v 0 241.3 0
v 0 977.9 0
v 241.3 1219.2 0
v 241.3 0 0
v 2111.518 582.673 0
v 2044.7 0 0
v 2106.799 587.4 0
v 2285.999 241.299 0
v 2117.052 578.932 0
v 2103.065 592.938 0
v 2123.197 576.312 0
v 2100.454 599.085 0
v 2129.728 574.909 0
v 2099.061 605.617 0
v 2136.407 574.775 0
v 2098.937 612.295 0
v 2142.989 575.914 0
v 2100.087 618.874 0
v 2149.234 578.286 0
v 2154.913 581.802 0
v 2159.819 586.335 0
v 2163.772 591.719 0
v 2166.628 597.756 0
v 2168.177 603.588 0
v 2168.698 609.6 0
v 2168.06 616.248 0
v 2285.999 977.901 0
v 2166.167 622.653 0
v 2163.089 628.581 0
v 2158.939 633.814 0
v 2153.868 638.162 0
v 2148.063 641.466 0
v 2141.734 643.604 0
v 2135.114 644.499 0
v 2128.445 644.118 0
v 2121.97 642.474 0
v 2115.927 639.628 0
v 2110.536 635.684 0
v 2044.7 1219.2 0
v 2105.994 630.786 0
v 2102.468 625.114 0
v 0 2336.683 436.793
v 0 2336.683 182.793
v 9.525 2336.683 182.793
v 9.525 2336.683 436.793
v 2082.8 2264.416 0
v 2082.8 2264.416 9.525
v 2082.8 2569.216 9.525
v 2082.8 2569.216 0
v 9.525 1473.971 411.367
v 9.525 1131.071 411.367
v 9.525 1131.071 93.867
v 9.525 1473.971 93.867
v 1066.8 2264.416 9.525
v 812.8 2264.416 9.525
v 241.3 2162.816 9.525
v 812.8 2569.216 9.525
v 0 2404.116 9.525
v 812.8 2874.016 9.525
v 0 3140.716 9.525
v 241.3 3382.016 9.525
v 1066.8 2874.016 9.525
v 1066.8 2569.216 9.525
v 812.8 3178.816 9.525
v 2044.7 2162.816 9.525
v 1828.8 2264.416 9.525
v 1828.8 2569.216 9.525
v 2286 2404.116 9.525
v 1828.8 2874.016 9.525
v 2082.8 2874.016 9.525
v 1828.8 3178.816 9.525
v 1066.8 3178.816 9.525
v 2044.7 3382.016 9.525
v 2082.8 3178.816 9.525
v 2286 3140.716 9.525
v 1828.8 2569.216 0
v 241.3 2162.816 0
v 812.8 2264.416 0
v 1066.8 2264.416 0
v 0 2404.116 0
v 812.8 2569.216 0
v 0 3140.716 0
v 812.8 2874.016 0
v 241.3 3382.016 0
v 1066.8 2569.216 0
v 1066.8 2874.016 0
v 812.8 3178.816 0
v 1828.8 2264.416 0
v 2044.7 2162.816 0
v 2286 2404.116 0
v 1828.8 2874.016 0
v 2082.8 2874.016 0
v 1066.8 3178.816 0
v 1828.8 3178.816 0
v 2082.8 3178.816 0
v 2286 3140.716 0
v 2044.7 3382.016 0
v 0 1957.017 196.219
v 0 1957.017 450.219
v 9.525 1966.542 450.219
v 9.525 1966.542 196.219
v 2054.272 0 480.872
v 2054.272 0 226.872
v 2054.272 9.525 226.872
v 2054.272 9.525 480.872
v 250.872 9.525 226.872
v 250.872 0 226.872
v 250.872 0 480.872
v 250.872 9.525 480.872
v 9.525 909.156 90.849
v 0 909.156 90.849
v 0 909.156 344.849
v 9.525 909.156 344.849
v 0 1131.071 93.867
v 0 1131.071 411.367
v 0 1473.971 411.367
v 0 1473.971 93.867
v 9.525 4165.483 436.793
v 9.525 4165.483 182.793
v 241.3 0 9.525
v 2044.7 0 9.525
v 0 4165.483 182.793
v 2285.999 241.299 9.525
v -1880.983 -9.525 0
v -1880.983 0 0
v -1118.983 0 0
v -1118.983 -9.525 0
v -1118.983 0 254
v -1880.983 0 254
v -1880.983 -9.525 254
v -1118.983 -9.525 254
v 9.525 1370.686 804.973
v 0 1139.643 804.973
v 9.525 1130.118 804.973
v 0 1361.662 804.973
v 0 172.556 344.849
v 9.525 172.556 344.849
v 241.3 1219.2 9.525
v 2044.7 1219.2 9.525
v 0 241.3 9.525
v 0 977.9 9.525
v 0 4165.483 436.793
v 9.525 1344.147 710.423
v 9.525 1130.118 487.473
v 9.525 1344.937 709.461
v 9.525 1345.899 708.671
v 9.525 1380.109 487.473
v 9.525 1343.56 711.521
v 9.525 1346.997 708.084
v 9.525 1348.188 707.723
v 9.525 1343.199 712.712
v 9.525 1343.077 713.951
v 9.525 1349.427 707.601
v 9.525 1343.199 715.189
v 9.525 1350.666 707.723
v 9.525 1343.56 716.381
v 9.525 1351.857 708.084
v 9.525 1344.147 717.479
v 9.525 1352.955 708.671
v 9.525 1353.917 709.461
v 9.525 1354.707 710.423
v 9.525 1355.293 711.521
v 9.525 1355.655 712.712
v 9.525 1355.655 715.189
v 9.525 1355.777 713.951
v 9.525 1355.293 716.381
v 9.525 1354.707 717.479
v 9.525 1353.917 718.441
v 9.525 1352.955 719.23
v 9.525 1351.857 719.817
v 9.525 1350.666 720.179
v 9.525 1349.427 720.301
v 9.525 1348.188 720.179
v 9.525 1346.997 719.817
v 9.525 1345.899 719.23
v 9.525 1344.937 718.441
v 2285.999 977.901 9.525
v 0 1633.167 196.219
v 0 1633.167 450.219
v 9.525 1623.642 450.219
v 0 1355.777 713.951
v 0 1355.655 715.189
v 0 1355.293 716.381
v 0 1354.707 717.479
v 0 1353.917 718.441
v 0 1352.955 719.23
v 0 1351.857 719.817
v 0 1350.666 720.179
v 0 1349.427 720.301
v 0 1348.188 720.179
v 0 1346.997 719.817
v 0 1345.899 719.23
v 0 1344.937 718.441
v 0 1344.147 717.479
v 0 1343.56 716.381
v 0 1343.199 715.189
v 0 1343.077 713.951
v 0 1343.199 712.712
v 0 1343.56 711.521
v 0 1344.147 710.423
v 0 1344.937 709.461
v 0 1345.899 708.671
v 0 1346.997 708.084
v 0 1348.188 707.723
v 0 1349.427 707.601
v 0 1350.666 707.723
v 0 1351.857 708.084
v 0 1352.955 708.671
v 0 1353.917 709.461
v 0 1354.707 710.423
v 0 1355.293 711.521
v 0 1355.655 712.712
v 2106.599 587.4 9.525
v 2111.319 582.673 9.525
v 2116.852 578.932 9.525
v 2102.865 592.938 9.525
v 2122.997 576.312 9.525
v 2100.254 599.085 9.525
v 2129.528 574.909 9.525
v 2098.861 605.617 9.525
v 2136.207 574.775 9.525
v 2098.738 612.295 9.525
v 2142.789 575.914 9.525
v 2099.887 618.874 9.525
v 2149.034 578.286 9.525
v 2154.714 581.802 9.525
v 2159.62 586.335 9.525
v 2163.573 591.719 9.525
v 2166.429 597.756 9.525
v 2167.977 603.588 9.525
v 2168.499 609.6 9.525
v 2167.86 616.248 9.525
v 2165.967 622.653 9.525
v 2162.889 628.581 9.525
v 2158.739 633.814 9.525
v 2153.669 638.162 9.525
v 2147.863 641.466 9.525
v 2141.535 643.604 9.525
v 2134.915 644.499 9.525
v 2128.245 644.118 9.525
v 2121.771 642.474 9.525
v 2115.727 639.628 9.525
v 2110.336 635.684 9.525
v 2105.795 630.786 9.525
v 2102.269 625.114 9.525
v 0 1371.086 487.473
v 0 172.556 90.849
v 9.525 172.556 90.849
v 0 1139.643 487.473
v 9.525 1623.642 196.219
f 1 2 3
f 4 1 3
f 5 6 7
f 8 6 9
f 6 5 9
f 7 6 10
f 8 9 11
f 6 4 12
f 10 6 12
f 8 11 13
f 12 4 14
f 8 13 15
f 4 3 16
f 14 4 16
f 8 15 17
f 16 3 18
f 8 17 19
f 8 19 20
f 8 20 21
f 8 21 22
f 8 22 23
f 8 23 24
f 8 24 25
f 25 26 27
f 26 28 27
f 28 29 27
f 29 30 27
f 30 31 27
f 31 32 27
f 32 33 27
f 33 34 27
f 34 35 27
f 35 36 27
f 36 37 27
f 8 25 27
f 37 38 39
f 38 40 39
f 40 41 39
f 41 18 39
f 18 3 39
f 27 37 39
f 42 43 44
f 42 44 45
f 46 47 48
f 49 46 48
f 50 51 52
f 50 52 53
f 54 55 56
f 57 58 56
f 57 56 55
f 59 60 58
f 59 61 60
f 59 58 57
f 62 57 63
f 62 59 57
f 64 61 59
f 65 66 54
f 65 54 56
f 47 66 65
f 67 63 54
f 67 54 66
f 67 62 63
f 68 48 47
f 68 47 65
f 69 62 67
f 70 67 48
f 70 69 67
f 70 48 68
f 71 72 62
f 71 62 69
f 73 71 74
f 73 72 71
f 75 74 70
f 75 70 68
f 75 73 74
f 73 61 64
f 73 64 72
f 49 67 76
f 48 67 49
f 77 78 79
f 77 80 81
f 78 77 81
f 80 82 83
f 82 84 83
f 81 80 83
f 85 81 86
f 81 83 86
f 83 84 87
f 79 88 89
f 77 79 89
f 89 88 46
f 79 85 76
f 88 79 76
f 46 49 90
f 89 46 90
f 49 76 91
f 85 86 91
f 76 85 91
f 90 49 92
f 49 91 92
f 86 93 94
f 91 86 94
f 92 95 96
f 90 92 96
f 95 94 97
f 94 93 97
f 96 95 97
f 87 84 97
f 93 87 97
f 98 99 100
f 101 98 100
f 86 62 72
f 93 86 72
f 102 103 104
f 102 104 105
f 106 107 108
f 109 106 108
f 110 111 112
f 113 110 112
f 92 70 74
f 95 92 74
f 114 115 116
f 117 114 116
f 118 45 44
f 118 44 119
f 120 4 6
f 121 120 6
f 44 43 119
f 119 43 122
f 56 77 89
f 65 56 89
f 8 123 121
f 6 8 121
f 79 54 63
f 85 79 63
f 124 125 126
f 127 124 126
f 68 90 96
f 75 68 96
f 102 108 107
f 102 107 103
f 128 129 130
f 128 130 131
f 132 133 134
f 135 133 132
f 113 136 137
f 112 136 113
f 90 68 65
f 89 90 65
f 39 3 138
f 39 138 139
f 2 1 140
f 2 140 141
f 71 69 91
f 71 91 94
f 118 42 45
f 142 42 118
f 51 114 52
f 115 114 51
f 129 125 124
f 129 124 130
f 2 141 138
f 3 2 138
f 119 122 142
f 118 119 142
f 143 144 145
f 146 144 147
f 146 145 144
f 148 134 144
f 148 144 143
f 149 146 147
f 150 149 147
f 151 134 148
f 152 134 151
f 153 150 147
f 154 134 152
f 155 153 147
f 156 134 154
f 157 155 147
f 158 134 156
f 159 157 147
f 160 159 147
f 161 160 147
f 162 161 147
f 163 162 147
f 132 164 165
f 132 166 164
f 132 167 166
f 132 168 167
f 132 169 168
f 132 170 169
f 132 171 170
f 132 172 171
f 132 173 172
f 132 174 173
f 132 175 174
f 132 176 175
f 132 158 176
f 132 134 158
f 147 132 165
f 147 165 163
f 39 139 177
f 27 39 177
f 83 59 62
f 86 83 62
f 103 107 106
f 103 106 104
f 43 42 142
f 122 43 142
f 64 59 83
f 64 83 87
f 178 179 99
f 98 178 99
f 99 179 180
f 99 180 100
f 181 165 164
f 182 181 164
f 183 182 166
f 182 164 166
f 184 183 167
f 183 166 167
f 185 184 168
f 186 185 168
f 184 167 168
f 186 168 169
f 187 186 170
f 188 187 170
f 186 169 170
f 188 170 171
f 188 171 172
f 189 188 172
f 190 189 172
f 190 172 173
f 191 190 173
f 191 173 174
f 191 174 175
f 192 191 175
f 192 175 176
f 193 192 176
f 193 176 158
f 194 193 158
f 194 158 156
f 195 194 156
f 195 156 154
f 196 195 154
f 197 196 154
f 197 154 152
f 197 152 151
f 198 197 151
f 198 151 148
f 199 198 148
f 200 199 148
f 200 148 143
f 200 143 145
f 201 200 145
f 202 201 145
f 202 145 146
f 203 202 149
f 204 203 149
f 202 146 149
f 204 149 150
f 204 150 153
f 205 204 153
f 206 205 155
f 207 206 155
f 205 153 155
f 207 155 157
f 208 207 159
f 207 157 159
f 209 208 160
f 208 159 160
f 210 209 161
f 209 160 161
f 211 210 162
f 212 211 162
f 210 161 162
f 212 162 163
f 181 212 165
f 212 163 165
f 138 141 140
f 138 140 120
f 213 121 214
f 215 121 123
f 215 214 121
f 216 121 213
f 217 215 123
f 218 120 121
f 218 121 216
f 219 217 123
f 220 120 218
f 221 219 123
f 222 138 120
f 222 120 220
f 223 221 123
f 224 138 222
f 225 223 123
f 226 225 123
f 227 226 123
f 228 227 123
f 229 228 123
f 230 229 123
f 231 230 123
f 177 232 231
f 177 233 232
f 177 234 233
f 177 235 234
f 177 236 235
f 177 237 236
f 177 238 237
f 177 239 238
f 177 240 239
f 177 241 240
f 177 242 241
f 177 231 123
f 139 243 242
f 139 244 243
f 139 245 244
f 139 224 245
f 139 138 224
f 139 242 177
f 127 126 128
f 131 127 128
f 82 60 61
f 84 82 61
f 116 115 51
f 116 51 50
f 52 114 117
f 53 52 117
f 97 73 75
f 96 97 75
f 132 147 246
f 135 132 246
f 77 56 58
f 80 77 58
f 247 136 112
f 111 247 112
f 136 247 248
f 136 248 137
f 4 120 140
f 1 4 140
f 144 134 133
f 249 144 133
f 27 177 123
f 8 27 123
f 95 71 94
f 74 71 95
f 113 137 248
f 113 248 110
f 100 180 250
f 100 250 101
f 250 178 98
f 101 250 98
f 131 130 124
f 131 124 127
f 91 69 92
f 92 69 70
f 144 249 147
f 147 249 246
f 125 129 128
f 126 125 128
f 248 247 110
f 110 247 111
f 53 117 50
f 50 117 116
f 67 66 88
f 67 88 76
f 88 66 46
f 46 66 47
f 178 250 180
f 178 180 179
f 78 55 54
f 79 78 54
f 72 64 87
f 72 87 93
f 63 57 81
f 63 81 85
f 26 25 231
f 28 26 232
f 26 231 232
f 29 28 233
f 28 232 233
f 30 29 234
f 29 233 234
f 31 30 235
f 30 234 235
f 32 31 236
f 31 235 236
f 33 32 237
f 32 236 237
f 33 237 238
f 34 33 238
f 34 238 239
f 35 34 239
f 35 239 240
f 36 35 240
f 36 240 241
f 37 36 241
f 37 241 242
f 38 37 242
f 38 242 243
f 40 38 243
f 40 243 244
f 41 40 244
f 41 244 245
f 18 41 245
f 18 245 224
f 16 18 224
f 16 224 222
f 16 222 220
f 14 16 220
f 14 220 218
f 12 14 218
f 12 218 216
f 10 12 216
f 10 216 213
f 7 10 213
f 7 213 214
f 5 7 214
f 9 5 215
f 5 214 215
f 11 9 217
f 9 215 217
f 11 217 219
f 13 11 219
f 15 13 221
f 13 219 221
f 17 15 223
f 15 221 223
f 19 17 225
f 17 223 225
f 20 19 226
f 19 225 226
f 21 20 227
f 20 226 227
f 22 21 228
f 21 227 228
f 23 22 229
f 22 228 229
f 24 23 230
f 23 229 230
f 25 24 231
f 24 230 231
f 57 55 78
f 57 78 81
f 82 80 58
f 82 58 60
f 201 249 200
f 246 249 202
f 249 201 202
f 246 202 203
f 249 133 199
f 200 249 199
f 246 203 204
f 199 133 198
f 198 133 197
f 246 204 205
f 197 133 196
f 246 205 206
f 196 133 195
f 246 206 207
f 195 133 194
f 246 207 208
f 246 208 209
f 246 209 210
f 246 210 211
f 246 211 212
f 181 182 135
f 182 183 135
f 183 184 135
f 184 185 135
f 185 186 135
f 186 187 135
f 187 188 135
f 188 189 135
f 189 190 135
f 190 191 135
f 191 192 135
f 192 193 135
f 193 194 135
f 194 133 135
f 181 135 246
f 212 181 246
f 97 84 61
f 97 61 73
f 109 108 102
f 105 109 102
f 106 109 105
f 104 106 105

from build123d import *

# Parameters (mm, degrees)
F0_W      = 2438.4
F0_H      = 1219.2
F1_DEPTH  = 9.525
F3_DEPTH  = 25.4
F5_DEPTH  = 25.4
F6_W      = 736.6
F6_H      = 254
F7_DEPTH  = 9.525
F8_W      = 1803.4
F8_H      = 254
F9_DEPTH  = 9.525
F10_W     = 736.6
F10_H     = 317.5
F11_DEPTH = 9.525
F12_W     = 254
F12_H     = 317.5
F13_DEPTH = 9.525
F15_DEPTH = 317.5
F18_DEPTH = 330.2
F19_R     = 6.35
F20_DEPTH = 25.4
F21_W     = 342.9
F21_H     = 317.5
F23_DEPTH = 9.525
F22_W     = 342.9
F22_H     = 254
F24_DEPTH = 9.525
F25_W     = 2286
F25_H     = 1219.2
F26_DEPTH = 9.525
F28_DEPTH = 25.4
F30_W     = 33.3816595376
F30_H     = 808.2542568445
F31_DEPTH = 25.4
F32_W     = 1828.8
F32_H     = 254
F33_DEPTH = 9.525
F34_W     = 762
F34_H     = 254
F35_DEPTH = 9.525
F37_DEPTH = 254
F38_W     = 254
F38_H     = 304.8
F39_DEPTH = 101.6
F40_R     = 34.925
F41_DEPTH = 127


# Not quite as in the source:
# - a feature names something its author has since deleted; it is built from what else it names


with BuildPart() as f1:
    # F0 (on Top) → F1 (new body)
    with BuildSketch(Plane.XY):
        with Locations((1219.2, 609.6)):
            Rectangle(F0_W, F0_H)
    extrude(amount=F1_DEPTH)

    # F2 (on face) → F3 (cut)
    with BuildSketch(Plane.XY.offset(9.525)):
        Polygon((0, 1219.2), (0, 977.9), (241.3, 1219.2), align=None)
        Polygon((241.3, 0), (0, 241.3), (0, 0), align=None)
    extrude(amount=-F3_DEPTH, mode=Mode.SUBTRACT)

    # F4 (on face) → F5 (cut)
    with BuildSketch(Plane.XY.offset(9.525)):
        Polygon((2438.4, 0), (2438.4, 1219.2), (2044.7, 1219.2), (2285.9994819731, 977.9005180269), (2285.9994819731, 241.2994819731), (2044.7, 0), align=None)
    extrude(amount=-F5_DEPTH, mode=Mode.SUBTRACT)

    # F30 (on face) → F31 (cut)
    with BuildSketch(Plane(origin=(-0.1994328009, 0, 9.5208224783), x_dir=(0.9997806835, 0, 0.0209424199), z_dir=(-0.0209424199, 0, 0.9997806835))):
        with Locations((-16.6908297688, 615.603916347)):
            Rectangle(F30_W, F30_H)
    extrude(amount=-F31_DEPTH, mode=Mode.SUBTRACT)

    # F40 (on face) → F41 (cut)
    with BuildSketch(Plane(origin=(-0.1994328009, 0, 9.5208224783), x_dir=(0.9997806835, 0, 0.0209424199), z_dir=(-0.0209424199, 0, 0.9997806835))):
        with Locations((2133.2976010596, 609.6)):
            Circle(F40_R)
    extrude(amount=-F41_DEPTH, mode=Mode.SUBTRACT)


with BuildPart() as f7:
    # F6 (on Right) → F7 (new body)
    with BuildSketch(Plane.YZ):
        with Locations((540.855868909, 217.8485281765)):
            Rectangle(F6_W, F6_H)
    extrude(amount=F7_DEPTH)


with BuildPart() as f9:
    # F8 (on Front) → F9 (new body)
    with BuildSketch(Plane.XZ):
        with Locations((1152.5721657038, 353.8724693788)):
            Rectangle(F8_W, F8_H)
    extrude(amount=-F9_DEPTH)


with BuildPart() as f11:
    # F10 (on Right) → F11 (new body)
    with BuildSketch(Plane.YZ):
        with Locations((396.9467690647, 657.1327268381)):
            Rectangle(F10_W, F10_H)
    extrude(amount=F11_DEPTH)


with BuildPart() as f13:
    # F12 (on Right) → F13 (new body)
    with BuildSketch(Plane.YZ):
        with Locations((1257.1182154525, 646.2227201939)):
            Rectangle(F12_W, F12_H)
    extrude(amount=F13_DEPTH)

    # F14 (on face) → F15 (cut)
    with BuildSketch(Plane.XY.offset(804.9727201939)):
        Polygon((0, 1130.1182154525), (9.525, 1130.1182154525), (0, 1139.6432154525), align=None)
    extrude(amount=-F15_DEPTH, mode=Mode.SUBTRACT)

    # F17 (on face) → F18 (cut)
    with BuildSketch(Plane(origin=(0, -13.2369765094, 446.0001862794), x_dir=(1, 0, 0), z_dir=(0, 0.0296662441, -0.9995598601))):
        Polygon((10.085565038, -1394.4936855086), (9.5443632454, -1393.981218338), (0, -1384.9436044693), (0, -1420.4403162003), (10.085565038, -1420.4403162003), align=None)
    extrude(amount=-F18_DEPTH, mode=Mode.SUBTRACT)

    # F19 (on face) → F20 (cut)
    with BuildSketch(Plane.YZ.offset(9.525)):
        with Locations((1349.4267463684, 713.9506340027)):
            Circle(F19_R)
    extrude(amount=-F20_DEPTH, mode=Mode.SUBTRACT)


with BuildPart() as f23:
    # F21 (on Right) → F23 (new body)
    with BuildSketch(Plane.YZ):
        with Locations((1302.5214076042, 252.6165406551)):
            Rectangle(F21_W, F21_H)
    extrude(amount=F23_DEPTH)


with BuildPart() as f24:
    # F22 (on Right) → F24 (new body)
    with BuildSketch(Plane.YZ):
        with Locations((1795.0915694237, 323.2190309106)):
            Rectangle(F22_W, F22_H)
    extrude(amount=F24_DEPTH)

    # F36 (on face) → F37 (cut)
    with BuildSketch(Plane.XY.offset(450.2190309106)):
        Polygon((0, 1957.0165694237), (9.525, 1966.5415694237), (0, 1966.5415694237), align=None)
        Polygon((0, 1623.6415694237), (9.525, 1623.6415694237), (0, 1633.1665694237), align=None)
    extrude(amount=-F37_DEPTH, mode=Mode.SUBTRACT)


with BuildPart() as f26:
    # F25 (on Top) → F26 (new body)
    with BuildSketch(Plane.XY):
        with Locations((1143, 2772.41582157)):
            Rectangle(F25_W, F25_H)
    extrude(amount=F26_DEPTH)

    # F27 (on face) → F28 (cut)
    with BuildSketch(Plane.XY.offset(9.525)):
        Polygon((241.3, 3382.01582157), (0, 3382.01582157), (0, 3140.71582157), align=None)
        Polygon((241.3, 2162.81582157), (0, 2404.11582157), (0, 2162.81582157), align=None)
        Polygon((2286, 3382.01582157), (2044.7, 3382.01582157), (2286, 3140.71582157), align=None)
        Polygon((2286, 2162.81582157), (2286, 2404.11582157), (2044.7, 2162.81582157), align=None)
    extrude(amount=-F28_DEPTH, mode=Mode.SUBTRACT)

    # F38 (on face) → F39 (cut)
    with BuildSketch(Plane.XY.offset(9.525)):
        with Locations((939.8, 3026.41582157)):
            Rectangle(F38_W, F38_H)
        with Locations((939.8, 2416.81582157)):
            Rectangle(F38_W, F38_H)
        with Locations((1955.8, 3026.41582157)):
            Rectangle(F38_W, F38_H)
        with Locations((1955.8, 2416.81582157)):
            Rectangle(F38_W, F38_H)
    extrude(amount=-F39_DEPTH, mode=Mode.SUBTRACT)


with BuildPart() as f33:
    # F32 (on Right) → F33 (new body)
    with BuildSketch(Plane.YZ):
        with Locations((3251.0826839447, 309.7931716245)):
            Rectangle(F32_W, F32_H)
    extrude(amount=F33_DEPTH)


with BuildPart() as f35:
    # F34 (on Front) → F35 (new body)
    with BuildSketch(Plane.XZ):
        with Locations((-1499.9832916029, 127)):
            Rectangle(F34_W, F34_H)
    extrude(amount=F35_DEPTH)


solid = Compound([f1.part, f7.part, f9.part, f13.part, f23.part, f24.part, f26.part, f33.part, f35.part])
